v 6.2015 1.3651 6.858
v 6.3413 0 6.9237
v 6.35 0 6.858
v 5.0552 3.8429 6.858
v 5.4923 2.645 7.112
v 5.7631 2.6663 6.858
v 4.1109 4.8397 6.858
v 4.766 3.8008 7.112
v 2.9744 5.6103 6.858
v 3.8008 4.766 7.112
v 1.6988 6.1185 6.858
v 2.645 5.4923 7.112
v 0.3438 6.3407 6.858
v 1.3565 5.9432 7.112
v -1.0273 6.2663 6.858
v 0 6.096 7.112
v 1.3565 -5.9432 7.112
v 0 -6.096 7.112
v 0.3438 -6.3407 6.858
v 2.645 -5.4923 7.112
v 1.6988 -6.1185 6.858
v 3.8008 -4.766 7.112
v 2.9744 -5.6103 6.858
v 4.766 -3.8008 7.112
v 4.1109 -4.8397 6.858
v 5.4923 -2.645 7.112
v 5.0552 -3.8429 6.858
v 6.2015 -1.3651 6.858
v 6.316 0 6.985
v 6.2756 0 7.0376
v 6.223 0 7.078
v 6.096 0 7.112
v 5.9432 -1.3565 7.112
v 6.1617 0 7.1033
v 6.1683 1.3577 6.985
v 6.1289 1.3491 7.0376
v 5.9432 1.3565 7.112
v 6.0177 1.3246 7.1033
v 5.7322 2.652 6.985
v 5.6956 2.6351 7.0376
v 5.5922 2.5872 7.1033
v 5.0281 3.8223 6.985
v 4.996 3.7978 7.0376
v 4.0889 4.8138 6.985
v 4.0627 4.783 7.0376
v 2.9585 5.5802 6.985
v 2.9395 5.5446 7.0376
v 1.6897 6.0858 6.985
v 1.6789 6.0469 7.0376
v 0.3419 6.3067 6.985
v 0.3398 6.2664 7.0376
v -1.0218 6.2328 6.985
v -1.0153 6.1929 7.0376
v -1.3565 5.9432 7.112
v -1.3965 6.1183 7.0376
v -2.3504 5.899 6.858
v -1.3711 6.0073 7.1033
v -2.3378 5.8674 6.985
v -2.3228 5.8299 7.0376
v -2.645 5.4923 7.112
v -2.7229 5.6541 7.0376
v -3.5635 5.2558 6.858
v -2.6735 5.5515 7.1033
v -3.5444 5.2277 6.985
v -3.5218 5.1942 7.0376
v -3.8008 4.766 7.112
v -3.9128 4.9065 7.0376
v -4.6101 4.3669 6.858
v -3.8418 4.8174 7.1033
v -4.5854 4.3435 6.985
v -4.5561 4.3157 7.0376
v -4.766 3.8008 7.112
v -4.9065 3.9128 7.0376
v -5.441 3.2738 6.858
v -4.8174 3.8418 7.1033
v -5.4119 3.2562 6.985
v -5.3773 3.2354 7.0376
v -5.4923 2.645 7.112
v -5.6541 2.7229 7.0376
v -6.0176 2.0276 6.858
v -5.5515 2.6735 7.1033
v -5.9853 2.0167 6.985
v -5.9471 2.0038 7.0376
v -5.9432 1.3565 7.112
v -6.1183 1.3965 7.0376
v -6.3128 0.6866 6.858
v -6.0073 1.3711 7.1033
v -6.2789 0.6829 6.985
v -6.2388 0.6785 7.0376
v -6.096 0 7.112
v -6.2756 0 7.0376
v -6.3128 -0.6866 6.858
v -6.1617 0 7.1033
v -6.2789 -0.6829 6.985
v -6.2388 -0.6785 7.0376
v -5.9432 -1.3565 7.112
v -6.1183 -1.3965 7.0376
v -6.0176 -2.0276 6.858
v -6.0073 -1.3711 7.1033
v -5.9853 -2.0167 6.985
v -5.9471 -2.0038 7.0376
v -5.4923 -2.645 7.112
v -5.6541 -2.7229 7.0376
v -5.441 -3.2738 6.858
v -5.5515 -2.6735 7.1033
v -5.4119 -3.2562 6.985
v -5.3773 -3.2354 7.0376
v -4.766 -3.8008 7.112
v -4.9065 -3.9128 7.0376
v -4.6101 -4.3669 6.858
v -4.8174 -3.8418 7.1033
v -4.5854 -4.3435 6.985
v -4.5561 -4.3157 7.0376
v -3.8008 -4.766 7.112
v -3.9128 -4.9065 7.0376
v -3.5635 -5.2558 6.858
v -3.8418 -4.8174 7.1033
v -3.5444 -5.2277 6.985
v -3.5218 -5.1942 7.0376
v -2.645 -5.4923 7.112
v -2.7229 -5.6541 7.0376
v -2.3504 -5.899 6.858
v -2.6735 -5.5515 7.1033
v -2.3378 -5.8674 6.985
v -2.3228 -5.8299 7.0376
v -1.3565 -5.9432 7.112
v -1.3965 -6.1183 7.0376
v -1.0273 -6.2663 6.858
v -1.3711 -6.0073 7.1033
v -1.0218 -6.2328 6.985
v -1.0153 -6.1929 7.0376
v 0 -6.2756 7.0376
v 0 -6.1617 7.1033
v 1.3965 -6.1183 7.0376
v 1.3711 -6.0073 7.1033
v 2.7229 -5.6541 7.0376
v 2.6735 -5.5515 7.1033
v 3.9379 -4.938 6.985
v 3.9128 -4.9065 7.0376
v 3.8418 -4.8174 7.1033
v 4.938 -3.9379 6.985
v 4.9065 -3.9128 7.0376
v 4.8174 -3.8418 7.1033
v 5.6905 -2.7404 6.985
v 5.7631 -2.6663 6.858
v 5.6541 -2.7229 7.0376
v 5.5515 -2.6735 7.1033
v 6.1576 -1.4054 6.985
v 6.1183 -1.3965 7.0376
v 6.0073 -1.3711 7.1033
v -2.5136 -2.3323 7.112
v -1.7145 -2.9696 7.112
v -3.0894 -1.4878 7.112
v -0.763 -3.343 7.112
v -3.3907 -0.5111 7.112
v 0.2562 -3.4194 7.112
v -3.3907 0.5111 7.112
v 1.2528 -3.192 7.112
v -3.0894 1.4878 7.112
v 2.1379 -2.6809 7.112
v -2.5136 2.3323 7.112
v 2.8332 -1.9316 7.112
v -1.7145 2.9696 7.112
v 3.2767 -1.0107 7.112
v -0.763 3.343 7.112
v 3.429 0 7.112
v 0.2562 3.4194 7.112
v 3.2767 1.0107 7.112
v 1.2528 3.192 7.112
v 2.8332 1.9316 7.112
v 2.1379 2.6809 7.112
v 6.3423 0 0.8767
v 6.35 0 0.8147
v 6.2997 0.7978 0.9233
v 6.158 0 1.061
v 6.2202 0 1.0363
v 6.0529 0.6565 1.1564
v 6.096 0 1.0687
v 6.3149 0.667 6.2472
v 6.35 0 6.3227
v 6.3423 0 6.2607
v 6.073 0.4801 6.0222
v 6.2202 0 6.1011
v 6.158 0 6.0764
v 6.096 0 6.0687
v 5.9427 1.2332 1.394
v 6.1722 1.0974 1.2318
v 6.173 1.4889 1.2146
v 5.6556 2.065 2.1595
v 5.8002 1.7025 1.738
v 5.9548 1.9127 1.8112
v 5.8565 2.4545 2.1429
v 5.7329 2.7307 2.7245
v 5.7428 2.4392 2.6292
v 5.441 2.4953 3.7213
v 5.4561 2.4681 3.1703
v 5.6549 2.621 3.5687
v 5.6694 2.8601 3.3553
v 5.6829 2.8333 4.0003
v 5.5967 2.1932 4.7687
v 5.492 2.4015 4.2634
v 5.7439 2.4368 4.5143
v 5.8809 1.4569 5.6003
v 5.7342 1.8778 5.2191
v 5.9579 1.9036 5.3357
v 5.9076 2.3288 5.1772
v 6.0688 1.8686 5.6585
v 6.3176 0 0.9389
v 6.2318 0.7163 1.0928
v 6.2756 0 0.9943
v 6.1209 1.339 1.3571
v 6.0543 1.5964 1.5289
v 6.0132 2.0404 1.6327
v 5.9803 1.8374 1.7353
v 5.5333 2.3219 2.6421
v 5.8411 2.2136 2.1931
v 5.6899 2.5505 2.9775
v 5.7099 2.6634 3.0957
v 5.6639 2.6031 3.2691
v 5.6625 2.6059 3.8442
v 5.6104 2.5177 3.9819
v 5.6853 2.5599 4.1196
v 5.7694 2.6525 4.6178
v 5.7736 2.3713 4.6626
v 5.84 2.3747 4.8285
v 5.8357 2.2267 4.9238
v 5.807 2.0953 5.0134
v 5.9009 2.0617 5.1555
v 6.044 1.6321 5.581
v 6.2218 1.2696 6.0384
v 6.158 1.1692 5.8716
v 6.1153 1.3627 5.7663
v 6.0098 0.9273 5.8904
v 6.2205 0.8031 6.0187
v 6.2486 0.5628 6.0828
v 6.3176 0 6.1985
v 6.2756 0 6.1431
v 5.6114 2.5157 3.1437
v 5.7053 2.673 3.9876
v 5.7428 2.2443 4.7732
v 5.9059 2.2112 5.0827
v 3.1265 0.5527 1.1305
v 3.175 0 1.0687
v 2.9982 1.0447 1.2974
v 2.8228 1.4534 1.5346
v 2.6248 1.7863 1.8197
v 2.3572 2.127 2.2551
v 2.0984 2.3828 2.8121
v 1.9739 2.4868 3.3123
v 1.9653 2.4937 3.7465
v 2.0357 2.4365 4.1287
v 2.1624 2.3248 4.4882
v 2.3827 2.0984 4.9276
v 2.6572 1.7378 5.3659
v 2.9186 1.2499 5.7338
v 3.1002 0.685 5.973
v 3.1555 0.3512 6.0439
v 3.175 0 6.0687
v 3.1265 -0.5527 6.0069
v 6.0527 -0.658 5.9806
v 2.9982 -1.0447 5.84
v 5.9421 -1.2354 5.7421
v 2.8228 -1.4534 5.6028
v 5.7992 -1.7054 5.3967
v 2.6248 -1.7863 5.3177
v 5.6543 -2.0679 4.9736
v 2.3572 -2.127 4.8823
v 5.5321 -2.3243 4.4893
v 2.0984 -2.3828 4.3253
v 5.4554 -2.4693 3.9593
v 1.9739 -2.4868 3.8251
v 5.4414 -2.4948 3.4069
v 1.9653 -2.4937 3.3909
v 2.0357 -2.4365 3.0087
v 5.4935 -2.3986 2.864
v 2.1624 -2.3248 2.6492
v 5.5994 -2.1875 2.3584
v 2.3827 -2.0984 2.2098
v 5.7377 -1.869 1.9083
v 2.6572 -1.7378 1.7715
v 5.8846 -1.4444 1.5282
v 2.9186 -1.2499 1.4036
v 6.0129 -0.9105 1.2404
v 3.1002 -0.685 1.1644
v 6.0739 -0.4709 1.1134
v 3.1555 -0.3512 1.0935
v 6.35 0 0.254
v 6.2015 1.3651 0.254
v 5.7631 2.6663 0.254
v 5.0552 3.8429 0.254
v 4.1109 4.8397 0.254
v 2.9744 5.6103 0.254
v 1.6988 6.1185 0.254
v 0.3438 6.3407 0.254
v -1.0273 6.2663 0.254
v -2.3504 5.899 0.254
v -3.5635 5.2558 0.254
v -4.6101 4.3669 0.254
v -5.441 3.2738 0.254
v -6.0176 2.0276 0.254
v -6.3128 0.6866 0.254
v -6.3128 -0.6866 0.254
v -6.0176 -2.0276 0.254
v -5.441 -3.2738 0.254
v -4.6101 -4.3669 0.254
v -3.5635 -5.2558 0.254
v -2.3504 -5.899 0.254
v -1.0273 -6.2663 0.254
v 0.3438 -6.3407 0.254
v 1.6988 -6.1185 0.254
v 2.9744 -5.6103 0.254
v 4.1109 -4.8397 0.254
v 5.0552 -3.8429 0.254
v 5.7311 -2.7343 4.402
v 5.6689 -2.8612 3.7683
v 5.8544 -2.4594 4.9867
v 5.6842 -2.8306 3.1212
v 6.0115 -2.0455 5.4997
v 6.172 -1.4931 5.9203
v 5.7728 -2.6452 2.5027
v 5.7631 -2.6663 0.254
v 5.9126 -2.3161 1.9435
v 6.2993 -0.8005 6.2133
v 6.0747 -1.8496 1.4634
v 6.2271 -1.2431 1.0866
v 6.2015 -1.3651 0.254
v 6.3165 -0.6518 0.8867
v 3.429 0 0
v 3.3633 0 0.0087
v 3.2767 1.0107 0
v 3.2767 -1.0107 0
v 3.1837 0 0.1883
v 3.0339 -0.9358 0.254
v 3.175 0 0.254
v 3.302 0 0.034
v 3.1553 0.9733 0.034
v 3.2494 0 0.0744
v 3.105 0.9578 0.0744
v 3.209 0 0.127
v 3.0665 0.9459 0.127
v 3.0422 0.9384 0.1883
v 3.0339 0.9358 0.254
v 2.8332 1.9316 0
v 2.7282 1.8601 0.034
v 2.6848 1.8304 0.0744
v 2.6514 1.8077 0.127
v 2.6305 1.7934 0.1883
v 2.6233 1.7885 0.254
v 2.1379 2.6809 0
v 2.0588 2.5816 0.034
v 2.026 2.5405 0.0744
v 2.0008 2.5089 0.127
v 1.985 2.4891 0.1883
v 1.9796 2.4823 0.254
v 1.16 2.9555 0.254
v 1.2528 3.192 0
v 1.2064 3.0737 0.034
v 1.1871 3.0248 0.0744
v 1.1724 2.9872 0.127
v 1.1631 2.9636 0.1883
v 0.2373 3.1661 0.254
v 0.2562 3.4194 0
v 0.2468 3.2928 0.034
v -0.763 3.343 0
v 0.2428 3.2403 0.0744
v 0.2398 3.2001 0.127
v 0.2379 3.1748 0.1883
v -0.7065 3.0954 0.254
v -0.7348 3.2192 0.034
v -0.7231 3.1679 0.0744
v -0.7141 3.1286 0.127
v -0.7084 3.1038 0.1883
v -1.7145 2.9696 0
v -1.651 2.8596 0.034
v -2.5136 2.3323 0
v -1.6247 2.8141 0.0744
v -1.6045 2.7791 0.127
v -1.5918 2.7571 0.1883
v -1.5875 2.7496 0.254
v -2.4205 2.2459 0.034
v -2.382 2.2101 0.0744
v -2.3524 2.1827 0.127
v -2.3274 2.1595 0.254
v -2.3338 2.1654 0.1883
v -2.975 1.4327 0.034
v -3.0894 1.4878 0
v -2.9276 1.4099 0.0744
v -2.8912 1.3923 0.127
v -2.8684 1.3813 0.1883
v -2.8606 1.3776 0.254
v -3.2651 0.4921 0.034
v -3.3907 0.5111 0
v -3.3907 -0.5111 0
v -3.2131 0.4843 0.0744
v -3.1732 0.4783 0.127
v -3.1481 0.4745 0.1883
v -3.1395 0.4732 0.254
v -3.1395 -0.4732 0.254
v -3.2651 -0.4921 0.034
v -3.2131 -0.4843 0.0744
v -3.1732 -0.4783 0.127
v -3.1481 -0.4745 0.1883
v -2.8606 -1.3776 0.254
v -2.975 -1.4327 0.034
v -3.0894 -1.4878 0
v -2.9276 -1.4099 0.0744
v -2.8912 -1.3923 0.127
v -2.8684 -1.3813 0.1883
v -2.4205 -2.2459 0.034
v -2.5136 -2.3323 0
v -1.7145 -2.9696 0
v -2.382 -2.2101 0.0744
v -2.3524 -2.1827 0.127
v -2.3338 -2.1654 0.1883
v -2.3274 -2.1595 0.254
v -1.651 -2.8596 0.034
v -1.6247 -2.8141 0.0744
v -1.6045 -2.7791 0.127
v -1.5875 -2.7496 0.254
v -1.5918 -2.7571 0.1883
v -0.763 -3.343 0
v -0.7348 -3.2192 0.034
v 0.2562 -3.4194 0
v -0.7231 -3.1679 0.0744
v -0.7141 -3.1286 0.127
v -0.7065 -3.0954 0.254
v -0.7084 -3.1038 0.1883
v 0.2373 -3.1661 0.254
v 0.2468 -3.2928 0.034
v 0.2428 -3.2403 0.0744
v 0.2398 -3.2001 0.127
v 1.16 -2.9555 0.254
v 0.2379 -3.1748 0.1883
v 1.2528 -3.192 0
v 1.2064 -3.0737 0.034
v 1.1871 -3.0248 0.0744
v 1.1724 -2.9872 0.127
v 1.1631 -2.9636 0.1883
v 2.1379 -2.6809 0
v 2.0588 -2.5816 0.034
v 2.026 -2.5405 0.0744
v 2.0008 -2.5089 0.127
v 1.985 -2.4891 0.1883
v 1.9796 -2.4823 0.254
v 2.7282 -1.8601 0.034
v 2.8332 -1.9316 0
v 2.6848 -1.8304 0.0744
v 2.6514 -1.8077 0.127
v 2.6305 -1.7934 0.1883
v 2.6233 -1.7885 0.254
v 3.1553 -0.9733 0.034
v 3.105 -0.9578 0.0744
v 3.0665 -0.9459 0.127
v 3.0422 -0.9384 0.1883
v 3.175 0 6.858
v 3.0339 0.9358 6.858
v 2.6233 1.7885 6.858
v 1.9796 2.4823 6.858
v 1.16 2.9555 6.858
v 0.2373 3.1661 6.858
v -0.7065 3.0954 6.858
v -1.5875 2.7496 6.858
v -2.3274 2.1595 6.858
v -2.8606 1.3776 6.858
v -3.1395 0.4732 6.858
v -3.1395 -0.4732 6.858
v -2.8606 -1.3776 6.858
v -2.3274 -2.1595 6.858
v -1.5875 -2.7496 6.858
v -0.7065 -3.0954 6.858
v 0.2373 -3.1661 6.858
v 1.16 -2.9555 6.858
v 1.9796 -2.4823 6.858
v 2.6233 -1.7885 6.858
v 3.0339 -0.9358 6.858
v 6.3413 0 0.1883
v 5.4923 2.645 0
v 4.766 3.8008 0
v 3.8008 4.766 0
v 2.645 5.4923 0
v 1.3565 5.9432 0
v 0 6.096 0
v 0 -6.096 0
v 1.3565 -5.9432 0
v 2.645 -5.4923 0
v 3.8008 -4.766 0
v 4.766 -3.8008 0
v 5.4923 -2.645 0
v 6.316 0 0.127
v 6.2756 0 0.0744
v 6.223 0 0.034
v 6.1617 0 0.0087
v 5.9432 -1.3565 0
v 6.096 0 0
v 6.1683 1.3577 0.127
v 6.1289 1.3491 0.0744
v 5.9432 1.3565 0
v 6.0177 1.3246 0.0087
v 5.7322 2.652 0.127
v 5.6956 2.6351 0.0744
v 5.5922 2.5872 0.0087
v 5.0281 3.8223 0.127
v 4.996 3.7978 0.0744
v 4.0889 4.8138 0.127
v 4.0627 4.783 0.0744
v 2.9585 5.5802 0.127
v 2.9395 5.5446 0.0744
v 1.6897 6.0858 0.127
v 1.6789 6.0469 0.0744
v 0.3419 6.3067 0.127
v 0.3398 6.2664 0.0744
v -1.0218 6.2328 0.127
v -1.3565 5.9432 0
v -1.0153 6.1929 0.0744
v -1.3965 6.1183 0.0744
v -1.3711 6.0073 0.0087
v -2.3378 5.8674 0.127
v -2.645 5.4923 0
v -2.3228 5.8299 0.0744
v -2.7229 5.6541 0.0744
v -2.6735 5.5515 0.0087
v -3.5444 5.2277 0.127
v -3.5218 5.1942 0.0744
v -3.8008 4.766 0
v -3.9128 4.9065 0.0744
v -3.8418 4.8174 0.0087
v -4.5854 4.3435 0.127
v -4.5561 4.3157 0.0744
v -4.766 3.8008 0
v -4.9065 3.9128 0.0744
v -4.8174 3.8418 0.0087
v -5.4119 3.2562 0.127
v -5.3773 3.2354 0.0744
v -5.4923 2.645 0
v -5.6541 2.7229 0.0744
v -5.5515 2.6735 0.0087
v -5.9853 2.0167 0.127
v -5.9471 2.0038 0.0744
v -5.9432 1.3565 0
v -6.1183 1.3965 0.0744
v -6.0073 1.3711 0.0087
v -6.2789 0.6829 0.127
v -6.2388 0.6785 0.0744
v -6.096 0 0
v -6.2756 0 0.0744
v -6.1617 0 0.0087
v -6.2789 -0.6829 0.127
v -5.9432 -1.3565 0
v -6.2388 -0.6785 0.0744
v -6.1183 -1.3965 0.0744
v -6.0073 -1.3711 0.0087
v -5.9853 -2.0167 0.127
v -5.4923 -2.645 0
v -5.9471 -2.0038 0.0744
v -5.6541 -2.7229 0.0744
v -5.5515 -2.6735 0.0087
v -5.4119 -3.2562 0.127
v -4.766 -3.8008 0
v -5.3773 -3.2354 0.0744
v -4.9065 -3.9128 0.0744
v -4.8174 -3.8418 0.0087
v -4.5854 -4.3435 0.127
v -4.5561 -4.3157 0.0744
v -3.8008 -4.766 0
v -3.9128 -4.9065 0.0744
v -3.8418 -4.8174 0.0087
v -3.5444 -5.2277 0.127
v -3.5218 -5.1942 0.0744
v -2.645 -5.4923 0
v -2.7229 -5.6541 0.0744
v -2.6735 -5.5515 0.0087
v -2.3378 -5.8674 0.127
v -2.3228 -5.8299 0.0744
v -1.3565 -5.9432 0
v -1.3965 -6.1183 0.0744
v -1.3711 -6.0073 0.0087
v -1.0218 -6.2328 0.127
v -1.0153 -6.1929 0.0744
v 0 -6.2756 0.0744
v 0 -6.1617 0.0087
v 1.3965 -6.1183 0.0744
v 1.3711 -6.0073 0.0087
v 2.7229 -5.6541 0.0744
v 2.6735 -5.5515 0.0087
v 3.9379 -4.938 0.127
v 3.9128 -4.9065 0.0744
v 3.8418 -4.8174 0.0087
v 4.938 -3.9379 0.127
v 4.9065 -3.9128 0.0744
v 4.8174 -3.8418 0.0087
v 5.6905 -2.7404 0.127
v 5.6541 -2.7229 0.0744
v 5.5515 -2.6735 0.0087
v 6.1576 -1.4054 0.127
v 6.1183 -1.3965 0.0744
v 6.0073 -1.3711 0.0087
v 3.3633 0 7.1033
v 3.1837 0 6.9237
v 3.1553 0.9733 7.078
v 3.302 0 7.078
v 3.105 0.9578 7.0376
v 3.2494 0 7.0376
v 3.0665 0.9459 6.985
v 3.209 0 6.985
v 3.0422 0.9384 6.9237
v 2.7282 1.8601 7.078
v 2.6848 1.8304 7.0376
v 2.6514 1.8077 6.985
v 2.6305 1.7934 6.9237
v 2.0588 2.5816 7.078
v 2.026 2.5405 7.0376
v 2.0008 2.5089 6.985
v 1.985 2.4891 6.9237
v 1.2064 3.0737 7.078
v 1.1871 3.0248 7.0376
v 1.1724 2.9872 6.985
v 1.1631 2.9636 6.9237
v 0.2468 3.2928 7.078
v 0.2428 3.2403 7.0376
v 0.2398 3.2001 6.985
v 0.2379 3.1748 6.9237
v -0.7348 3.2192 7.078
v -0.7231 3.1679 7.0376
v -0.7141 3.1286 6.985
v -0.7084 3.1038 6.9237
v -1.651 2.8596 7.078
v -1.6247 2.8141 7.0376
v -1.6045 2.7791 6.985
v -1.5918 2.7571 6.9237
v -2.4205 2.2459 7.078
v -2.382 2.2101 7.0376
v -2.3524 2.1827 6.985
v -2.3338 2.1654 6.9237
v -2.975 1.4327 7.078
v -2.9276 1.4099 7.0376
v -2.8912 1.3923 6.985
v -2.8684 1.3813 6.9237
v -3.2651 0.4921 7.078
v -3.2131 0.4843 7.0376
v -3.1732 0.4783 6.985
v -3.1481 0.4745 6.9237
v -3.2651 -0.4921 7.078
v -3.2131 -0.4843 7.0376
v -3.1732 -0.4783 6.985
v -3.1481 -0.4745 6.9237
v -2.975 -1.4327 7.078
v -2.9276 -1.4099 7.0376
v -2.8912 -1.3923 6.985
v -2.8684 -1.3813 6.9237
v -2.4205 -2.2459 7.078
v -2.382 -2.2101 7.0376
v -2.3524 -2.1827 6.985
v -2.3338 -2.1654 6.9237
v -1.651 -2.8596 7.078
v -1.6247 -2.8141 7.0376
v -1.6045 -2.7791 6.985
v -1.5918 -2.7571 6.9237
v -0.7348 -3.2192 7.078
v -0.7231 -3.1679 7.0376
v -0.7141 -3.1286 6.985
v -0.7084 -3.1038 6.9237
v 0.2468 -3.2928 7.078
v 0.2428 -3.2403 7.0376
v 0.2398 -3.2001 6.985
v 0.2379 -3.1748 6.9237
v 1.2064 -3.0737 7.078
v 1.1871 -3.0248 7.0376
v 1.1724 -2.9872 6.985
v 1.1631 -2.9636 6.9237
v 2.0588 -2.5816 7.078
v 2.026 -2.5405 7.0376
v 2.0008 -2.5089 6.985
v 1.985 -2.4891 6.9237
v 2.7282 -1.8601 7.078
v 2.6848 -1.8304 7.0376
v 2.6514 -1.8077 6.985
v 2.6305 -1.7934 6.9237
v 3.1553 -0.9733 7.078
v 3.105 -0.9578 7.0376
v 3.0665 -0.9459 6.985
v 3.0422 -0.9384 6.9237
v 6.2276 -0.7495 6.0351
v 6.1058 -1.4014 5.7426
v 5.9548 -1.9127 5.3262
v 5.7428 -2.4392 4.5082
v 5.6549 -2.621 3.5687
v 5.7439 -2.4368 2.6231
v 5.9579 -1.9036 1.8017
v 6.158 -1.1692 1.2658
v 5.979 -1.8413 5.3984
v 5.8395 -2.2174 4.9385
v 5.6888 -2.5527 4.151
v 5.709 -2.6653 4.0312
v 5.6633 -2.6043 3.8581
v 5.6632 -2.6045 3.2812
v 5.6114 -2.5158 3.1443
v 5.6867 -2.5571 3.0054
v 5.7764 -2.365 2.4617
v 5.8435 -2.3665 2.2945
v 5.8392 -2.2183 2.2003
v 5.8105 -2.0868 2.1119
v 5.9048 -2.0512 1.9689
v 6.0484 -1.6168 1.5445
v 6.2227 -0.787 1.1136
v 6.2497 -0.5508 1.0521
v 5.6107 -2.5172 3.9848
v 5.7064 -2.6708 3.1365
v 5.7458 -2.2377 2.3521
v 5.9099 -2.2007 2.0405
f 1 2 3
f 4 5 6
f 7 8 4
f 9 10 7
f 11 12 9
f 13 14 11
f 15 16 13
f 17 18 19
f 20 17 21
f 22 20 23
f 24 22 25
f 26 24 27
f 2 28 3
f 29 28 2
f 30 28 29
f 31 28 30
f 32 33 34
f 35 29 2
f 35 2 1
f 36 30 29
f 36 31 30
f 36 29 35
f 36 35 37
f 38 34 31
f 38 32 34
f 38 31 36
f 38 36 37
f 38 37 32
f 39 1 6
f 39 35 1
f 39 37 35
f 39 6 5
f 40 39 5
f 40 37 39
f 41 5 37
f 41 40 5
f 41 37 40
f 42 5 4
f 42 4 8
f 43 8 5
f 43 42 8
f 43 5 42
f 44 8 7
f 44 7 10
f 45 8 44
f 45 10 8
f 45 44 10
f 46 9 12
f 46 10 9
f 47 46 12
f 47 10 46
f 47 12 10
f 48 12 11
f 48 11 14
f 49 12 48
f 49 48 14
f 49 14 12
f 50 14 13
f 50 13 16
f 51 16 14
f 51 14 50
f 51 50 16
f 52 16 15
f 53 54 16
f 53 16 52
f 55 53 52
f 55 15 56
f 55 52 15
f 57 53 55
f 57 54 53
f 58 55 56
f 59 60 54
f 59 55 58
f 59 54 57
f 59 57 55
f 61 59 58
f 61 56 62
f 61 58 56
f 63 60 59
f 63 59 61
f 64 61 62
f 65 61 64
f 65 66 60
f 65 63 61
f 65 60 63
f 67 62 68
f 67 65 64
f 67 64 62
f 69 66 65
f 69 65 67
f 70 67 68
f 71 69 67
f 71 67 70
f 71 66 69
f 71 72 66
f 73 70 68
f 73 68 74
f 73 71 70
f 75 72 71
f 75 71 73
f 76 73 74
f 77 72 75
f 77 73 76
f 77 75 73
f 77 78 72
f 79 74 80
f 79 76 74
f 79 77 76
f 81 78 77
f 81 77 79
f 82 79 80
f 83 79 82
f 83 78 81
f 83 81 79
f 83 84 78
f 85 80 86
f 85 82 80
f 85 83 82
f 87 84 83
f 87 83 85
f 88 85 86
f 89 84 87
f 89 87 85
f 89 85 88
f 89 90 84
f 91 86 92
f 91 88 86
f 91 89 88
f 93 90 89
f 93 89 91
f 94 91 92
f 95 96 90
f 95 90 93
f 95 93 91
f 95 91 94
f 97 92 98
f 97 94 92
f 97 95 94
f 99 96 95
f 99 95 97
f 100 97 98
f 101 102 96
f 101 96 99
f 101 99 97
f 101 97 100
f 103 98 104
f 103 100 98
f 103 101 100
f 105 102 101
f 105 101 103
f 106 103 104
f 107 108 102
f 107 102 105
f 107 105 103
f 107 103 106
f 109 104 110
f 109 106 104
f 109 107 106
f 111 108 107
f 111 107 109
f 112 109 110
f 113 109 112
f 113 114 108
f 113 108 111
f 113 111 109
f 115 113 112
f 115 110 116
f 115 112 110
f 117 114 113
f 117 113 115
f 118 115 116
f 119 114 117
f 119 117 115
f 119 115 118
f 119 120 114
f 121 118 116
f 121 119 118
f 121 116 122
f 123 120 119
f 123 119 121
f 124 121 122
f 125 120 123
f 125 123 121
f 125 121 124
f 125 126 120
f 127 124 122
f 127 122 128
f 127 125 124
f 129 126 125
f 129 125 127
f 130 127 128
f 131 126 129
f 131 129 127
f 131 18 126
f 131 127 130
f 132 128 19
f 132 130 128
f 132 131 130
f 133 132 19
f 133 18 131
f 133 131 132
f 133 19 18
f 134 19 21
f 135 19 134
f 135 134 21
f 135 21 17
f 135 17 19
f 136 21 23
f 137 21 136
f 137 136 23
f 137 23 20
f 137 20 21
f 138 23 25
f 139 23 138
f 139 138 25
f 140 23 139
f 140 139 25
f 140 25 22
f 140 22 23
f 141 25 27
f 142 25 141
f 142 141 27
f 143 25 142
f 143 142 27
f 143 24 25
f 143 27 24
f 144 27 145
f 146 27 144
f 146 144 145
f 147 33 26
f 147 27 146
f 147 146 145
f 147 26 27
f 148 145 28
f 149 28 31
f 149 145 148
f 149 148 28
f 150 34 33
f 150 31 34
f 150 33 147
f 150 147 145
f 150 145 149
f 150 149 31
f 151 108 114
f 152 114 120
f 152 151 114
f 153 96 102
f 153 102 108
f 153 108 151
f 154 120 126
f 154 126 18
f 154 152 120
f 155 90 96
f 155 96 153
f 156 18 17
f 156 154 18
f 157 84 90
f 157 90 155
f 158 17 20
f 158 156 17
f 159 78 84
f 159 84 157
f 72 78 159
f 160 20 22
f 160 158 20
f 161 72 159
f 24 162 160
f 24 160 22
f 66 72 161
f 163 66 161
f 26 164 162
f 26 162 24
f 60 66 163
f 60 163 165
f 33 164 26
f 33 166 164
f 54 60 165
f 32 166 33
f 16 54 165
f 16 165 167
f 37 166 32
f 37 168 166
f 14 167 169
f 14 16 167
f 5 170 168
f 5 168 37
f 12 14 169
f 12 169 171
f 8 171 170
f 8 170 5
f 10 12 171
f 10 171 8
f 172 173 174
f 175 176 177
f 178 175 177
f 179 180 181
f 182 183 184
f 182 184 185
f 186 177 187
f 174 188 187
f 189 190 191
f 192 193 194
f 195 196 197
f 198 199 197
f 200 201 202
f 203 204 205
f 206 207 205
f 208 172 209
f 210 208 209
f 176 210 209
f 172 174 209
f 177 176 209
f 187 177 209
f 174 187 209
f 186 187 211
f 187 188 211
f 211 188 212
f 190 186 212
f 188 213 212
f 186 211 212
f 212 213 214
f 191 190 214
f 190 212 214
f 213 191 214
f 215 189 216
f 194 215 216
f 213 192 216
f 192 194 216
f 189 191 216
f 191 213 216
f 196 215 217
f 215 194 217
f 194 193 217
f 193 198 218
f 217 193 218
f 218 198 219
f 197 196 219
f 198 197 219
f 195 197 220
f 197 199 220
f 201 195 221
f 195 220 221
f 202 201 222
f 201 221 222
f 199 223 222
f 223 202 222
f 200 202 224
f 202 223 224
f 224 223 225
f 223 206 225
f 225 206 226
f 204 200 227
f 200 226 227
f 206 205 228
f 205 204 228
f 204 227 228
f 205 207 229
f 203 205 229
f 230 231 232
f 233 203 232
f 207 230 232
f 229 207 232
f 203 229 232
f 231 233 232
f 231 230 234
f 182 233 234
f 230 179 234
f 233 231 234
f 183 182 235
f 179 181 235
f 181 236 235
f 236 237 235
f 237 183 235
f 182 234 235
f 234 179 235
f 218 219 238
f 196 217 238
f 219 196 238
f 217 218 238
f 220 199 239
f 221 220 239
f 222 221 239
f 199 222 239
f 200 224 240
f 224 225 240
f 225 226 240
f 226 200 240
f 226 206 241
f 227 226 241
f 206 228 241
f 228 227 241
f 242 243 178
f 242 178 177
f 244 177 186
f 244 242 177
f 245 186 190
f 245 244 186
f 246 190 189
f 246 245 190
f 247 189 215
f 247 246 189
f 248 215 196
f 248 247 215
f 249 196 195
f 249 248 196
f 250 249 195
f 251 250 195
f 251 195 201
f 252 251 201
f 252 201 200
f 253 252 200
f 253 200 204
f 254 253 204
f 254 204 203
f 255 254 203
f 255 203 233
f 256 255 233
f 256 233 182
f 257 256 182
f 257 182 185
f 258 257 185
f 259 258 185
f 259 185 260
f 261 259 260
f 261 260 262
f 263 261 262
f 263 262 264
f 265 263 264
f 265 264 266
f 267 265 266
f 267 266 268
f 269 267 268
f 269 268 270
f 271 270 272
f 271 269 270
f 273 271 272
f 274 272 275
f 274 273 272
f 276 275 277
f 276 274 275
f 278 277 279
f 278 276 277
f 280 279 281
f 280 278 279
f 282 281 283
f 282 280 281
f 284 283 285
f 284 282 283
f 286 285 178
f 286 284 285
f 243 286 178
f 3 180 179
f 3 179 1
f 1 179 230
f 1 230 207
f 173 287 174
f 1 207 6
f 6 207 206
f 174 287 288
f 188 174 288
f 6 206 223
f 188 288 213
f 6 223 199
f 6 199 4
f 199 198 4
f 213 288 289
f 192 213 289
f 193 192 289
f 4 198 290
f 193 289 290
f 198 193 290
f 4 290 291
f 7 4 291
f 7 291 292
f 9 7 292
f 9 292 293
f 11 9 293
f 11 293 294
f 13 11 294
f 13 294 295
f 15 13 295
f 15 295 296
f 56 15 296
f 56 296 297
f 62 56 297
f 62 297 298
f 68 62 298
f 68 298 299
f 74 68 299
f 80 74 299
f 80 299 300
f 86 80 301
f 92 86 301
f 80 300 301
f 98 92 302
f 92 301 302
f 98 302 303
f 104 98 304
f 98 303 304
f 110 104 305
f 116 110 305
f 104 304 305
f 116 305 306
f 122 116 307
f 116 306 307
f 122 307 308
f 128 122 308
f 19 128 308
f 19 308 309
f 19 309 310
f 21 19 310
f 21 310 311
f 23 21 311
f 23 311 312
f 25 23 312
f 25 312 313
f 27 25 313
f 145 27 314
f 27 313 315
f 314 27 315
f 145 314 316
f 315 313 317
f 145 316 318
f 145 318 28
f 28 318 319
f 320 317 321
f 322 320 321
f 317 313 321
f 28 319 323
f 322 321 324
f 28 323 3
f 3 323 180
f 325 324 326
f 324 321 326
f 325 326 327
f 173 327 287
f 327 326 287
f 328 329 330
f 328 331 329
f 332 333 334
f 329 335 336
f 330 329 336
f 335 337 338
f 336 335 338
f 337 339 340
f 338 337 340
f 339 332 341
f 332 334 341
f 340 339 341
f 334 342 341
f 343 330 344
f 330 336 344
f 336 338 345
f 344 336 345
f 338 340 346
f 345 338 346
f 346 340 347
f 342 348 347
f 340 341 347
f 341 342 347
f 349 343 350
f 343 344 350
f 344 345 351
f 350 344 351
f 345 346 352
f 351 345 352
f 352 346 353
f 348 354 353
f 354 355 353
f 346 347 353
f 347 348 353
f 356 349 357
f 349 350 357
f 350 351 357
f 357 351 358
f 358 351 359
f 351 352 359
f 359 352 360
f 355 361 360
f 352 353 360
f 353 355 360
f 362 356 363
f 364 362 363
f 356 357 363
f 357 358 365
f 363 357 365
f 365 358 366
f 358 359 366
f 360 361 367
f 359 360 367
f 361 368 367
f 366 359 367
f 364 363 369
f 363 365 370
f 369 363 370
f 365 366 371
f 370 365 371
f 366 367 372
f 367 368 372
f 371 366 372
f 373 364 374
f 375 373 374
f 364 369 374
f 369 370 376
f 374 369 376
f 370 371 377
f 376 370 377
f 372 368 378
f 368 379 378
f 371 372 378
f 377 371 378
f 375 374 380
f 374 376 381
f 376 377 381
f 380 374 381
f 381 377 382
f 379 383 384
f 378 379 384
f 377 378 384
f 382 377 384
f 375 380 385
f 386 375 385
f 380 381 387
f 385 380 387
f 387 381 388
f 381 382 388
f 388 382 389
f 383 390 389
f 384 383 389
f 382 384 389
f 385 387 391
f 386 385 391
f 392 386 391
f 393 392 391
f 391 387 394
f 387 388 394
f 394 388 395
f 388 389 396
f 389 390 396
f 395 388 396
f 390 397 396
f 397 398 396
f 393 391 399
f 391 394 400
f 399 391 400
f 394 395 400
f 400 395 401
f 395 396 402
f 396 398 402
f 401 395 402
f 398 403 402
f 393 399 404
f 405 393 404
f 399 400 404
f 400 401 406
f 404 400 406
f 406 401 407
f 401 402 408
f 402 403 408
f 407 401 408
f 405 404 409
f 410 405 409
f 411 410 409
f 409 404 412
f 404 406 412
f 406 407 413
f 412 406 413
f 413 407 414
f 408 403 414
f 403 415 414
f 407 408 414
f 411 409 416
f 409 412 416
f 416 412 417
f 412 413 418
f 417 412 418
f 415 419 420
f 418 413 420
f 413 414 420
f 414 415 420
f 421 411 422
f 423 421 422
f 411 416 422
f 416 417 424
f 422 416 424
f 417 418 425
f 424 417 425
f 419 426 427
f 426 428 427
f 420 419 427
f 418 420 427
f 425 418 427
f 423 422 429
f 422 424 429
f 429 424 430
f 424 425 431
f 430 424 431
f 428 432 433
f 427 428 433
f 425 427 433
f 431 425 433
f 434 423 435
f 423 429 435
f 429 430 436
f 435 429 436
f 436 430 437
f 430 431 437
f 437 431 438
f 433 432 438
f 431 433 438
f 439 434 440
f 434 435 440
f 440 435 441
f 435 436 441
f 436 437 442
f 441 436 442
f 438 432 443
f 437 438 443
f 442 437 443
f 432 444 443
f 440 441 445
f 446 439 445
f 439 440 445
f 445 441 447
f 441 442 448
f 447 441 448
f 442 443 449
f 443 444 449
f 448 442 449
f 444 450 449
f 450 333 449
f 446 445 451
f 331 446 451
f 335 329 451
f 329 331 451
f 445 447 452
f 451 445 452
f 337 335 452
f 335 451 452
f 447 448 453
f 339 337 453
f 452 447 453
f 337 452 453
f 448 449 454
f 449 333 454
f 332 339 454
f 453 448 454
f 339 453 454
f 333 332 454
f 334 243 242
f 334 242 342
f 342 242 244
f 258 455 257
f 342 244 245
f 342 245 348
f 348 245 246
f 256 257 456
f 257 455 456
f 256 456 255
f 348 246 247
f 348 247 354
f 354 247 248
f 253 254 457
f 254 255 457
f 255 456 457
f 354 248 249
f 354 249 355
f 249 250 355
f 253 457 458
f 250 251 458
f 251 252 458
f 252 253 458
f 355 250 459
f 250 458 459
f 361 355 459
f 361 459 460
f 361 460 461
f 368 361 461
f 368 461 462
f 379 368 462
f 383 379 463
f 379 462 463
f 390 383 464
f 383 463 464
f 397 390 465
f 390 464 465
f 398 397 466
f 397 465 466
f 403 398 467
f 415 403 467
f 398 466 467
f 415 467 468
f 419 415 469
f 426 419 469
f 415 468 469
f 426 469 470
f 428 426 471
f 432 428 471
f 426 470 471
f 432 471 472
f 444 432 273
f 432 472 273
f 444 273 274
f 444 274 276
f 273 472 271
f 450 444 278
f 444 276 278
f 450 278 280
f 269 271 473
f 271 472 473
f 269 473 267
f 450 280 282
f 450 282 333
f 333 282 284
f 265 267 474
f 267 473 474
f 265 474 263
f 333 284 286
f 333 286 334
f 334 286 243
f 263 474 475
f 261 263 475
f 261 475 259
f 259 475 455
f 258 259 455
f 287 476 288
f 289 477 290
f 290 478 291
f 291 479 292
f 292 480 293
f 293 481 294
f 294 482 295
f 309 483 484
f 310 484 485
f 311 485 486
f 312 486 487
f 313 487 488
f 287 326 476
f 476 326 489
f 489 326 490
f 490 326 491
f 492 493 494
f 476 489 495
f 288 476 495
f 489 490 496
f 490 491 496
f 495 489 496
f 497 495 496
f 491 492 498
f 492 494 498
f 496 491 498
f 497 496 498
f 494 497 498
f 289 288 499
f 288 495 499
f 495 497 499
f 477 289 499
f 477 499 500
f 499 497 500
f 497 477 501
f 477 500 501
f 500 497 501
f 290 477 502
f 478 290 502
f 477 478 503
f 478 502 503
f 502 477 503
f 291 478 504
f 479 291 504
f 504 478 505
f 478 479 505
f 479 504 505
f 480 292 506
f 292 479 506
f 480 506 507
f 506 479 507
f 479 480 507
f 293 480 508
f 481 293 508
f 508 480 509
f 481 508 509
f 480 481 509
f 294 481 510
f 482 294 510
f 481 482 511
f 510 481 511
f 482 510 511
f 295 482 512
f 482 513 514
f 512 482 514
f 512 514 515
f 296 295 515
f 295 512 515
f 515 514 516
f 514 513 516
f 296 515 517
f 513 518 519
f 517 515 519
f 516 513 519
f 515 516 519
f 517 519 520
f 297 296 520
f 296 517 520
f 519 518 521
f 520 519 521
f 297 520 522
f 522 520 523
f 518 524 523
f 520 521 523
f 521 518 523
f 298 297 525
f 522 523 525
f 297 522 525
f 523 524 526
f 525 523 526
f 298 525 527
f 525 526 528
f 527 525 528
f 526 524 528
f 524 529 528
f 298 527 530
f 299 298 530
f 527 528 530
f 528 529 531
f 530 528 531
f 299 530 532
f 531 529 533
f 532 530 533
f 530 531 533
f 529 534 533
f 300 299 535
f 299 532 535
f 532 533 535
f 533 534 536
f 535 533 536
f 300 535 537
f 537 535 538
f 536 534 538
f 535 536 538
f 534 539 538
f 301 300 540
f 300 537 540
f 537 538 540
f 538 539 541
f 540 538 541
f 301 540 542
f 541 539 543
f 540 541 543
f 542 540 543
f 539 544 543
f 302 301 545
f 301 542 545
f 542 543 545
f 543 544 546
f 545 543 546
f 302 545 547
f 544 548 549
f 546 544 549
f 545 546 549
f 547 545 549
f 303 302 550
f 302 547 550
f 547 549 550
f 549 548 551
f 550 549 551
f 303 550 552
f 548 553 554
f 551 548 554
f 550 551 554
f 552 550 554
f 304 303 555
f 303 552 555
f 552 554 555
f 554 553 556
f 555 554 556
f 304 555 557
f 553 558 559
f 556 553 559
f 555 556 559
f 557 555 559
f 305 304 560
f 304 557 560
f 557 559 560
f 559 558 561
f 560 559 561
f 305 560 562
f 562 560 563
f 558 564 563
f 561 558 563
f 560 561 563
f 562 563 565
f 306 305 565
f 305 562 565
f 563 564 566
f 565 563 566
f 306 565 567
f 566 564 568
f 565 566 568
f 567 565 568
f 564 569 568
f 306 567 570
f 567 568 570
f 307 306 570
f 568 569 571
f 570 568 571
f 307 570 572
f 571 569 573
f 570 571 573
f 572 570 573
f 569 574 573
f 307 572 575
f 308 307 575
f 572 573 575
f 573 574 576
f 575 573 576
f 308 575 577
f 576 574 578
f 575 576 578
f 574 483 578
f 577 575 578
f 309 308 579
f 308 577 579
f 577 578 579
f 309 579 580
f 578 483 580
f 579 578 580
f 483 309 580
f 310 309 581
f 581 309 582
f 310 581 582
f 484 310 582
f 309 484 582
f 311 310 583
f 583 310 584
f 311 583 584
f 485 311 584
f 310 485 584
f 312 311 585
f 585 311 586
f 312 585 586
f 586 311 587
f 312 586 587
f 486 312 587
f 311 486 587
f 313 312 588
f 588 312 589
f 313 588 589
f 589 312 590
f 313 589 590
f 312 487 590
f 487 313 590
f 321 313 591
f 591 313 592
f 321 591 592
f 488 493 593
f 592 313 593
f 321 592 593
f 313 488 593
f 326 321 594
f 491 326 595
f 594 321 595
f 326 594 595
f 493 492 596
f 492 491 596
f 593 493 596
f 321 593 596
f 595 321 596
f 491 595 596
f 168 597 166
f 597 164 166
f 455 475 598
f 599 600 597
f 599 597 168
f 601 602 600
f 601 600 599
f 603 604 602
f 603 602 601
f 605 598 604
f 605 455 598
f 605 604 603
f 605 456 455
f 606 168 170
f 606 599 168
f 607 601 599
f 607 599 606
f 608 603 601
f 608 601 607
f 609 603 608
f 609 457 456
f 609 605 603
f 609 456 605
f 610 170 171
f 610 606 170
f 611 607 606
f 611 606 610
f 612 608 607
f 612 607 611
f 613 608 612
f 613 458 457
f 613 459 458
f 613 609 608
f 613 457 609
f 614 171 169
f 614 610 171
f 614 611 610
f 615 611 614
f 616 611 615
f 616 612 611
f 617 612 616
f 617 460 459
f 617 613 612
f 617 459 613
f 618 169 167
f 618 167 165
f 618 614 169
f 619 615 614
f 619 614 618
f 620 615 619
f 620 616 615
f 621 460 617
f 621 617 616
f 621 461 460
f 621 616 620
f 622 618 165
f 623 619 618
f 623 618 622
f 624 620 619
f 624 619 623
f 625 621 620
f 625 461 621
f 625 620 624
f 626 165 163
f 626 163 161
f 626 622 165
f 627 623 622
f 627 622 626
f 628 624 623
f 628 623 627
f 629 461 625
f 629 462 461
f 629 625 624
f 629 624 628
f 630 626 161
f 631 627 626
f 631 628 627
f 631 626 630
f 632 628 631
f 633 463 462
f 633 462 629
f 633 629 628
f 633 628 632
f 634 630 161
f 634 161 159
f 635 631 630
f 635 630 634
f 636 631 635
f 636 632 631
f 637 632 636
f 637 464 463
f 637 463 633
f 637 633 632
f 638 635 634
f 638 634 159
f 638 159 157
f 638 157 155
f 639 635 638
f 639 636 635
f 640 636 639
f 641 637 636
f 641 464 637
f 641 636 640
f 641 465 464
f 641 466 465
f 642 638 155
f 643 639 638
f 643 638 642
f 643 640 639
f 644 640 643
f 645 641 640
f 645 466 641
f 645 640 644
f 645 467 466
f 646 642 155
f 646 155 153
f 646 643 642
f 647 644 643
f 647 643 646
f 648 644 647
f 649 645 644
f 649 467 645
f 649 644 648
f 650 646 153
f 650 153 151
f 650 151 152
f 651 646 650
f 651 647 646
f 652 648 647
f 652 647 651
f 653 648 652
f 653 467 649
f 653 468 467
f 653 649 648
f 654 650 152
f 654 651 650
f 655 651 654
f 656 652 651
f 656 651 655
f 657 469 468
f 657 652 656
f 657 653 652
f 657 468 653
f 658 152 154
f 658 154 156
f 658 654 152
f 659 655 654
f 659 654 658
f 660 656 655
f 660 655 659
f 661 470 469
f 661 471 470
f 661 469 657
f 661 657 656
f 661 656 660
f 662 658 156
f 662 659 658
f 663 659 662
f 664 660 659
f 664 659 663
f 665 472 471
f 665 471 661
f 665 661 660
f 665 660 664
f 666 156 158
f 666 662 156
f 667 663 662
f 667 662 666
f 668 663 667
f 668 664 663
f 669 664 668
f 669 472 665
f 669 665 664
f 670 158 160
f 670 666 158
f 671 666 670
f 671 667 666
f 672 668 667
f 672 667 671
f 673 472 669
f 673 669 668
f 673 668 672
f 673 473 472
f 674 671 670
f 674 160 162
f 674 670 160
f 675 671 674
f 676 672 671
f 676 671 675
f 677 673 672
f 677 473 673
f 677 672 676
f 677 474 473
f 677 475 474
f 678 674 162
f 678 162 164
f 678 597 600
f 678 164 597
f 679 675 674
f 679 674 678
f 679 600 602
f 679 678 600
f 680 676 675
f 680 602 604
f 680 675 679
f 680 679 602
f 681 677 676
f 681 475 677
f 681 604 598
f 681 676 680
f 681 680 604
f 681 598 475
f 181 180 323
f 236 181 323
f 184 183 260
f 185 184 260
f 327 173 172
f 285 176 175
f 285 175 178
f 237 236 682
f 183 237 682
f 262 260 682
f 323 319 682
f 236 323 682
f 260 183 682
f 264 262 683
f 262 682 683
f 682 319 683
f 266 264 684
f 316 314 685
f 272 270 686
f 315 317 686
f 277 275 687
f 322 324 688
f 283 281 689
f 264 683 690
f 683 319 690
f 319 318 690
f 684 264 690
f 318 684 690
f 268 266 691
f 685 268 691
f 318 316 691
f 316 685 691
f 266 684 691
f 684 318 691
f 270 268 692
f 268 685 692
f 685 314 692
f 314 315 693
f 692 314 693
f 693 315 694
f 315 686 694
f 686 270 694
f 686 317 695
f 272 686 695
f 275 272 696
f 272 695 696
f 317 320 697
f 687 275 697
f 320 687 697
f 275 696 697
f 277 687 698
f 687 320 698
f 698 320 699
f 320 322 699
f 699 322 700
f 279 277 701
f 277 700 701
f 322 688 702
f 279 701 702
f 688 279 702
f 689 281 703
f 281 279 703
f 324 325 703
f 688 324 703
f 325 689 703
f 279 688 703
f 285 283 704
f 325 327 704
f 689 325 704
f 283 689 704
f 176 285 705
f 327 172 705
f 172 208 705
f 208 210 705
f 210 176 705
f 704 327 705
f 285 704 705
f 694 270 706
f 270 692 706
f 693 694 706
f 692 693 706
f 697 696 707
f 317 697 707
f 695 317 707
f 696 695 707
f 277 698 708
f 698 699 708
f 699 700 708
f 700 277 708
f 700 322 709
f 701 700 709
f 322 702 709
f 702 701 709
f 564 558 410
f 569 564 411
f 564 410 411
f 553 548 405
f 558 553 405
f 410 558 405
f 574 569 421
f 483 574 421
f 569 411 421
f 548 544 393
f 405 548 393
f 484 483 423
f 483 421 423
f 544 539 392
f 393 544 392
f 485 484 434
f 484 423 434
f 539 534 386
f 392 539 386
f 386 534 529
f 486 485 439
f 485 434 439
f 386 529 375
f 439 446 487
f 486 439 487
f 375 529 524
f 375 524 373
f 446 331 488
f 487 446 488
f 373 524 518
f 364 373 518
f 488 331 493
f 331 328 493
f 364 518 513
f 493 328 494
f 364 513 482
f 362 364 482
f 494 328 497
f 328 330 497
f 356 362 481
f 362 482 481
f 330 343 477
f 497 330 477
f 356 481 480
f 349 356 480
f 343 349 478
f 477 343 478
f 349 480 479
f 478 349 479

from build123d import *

# Parameters (mm, degrees)
SKETCH2_R           = 6.35
BOSS_EXTRUDE1_DEPTH = 7.112
SKETCH3_R           = 3.175
CUT_EXTRUDE1_DEPTH  = 19.05
SKETCH4_R           = 2.499999953
CUT_EXTRUDE2_DEPTH  = 19.05
FILLET1_R           = 0.254


with BuildPart() as part:
    # Sketch2 → Boss-Extrude1 (new body)
    with BuildSketch(Plane.XY):
        Circle(SKETCH2_R)
    extrude(amount=BOSS_EXTRUDE1_DEPTH)

    # Sketch3 → Cut-Extrude1 (cut)
    with BuildSketch(Plane.XY.offset(7.112)):
        Circle(SKETCH3_R)
    extrude(amount=-CUT_EXTRUDE1_DEPTH, mode=Mode.SUBTRACT)

    # Sketch4 → Cut-Extrude2 (cut)
    with BuildSketch(Plane(origin=(0, 0, 0), x_dir=(0, 0, -1), z_dir=(1, 0, 0))):
        with Locations((-3.5687, 0)):
            Circle(SKETCH4_R)
    extrude(amount=CUT_EXTRUDE2_DEPTH, mode=Mode.SUBTRACT)

    # Fillet1
    fillet1_edges = [part.edges().sort_by_distance(p)[0] for p in [
        (5.837165428, 2.499999953, 3.5687),
        (-6.35, 0, 0),
        (-6.35, 0, 7.112),
        (-3.175, 0, 0),
        (-3.175, 0, 7.112),
    ]]
    fillet(fillet1_edges, radius=FILLET1_R)


solid = part.part
